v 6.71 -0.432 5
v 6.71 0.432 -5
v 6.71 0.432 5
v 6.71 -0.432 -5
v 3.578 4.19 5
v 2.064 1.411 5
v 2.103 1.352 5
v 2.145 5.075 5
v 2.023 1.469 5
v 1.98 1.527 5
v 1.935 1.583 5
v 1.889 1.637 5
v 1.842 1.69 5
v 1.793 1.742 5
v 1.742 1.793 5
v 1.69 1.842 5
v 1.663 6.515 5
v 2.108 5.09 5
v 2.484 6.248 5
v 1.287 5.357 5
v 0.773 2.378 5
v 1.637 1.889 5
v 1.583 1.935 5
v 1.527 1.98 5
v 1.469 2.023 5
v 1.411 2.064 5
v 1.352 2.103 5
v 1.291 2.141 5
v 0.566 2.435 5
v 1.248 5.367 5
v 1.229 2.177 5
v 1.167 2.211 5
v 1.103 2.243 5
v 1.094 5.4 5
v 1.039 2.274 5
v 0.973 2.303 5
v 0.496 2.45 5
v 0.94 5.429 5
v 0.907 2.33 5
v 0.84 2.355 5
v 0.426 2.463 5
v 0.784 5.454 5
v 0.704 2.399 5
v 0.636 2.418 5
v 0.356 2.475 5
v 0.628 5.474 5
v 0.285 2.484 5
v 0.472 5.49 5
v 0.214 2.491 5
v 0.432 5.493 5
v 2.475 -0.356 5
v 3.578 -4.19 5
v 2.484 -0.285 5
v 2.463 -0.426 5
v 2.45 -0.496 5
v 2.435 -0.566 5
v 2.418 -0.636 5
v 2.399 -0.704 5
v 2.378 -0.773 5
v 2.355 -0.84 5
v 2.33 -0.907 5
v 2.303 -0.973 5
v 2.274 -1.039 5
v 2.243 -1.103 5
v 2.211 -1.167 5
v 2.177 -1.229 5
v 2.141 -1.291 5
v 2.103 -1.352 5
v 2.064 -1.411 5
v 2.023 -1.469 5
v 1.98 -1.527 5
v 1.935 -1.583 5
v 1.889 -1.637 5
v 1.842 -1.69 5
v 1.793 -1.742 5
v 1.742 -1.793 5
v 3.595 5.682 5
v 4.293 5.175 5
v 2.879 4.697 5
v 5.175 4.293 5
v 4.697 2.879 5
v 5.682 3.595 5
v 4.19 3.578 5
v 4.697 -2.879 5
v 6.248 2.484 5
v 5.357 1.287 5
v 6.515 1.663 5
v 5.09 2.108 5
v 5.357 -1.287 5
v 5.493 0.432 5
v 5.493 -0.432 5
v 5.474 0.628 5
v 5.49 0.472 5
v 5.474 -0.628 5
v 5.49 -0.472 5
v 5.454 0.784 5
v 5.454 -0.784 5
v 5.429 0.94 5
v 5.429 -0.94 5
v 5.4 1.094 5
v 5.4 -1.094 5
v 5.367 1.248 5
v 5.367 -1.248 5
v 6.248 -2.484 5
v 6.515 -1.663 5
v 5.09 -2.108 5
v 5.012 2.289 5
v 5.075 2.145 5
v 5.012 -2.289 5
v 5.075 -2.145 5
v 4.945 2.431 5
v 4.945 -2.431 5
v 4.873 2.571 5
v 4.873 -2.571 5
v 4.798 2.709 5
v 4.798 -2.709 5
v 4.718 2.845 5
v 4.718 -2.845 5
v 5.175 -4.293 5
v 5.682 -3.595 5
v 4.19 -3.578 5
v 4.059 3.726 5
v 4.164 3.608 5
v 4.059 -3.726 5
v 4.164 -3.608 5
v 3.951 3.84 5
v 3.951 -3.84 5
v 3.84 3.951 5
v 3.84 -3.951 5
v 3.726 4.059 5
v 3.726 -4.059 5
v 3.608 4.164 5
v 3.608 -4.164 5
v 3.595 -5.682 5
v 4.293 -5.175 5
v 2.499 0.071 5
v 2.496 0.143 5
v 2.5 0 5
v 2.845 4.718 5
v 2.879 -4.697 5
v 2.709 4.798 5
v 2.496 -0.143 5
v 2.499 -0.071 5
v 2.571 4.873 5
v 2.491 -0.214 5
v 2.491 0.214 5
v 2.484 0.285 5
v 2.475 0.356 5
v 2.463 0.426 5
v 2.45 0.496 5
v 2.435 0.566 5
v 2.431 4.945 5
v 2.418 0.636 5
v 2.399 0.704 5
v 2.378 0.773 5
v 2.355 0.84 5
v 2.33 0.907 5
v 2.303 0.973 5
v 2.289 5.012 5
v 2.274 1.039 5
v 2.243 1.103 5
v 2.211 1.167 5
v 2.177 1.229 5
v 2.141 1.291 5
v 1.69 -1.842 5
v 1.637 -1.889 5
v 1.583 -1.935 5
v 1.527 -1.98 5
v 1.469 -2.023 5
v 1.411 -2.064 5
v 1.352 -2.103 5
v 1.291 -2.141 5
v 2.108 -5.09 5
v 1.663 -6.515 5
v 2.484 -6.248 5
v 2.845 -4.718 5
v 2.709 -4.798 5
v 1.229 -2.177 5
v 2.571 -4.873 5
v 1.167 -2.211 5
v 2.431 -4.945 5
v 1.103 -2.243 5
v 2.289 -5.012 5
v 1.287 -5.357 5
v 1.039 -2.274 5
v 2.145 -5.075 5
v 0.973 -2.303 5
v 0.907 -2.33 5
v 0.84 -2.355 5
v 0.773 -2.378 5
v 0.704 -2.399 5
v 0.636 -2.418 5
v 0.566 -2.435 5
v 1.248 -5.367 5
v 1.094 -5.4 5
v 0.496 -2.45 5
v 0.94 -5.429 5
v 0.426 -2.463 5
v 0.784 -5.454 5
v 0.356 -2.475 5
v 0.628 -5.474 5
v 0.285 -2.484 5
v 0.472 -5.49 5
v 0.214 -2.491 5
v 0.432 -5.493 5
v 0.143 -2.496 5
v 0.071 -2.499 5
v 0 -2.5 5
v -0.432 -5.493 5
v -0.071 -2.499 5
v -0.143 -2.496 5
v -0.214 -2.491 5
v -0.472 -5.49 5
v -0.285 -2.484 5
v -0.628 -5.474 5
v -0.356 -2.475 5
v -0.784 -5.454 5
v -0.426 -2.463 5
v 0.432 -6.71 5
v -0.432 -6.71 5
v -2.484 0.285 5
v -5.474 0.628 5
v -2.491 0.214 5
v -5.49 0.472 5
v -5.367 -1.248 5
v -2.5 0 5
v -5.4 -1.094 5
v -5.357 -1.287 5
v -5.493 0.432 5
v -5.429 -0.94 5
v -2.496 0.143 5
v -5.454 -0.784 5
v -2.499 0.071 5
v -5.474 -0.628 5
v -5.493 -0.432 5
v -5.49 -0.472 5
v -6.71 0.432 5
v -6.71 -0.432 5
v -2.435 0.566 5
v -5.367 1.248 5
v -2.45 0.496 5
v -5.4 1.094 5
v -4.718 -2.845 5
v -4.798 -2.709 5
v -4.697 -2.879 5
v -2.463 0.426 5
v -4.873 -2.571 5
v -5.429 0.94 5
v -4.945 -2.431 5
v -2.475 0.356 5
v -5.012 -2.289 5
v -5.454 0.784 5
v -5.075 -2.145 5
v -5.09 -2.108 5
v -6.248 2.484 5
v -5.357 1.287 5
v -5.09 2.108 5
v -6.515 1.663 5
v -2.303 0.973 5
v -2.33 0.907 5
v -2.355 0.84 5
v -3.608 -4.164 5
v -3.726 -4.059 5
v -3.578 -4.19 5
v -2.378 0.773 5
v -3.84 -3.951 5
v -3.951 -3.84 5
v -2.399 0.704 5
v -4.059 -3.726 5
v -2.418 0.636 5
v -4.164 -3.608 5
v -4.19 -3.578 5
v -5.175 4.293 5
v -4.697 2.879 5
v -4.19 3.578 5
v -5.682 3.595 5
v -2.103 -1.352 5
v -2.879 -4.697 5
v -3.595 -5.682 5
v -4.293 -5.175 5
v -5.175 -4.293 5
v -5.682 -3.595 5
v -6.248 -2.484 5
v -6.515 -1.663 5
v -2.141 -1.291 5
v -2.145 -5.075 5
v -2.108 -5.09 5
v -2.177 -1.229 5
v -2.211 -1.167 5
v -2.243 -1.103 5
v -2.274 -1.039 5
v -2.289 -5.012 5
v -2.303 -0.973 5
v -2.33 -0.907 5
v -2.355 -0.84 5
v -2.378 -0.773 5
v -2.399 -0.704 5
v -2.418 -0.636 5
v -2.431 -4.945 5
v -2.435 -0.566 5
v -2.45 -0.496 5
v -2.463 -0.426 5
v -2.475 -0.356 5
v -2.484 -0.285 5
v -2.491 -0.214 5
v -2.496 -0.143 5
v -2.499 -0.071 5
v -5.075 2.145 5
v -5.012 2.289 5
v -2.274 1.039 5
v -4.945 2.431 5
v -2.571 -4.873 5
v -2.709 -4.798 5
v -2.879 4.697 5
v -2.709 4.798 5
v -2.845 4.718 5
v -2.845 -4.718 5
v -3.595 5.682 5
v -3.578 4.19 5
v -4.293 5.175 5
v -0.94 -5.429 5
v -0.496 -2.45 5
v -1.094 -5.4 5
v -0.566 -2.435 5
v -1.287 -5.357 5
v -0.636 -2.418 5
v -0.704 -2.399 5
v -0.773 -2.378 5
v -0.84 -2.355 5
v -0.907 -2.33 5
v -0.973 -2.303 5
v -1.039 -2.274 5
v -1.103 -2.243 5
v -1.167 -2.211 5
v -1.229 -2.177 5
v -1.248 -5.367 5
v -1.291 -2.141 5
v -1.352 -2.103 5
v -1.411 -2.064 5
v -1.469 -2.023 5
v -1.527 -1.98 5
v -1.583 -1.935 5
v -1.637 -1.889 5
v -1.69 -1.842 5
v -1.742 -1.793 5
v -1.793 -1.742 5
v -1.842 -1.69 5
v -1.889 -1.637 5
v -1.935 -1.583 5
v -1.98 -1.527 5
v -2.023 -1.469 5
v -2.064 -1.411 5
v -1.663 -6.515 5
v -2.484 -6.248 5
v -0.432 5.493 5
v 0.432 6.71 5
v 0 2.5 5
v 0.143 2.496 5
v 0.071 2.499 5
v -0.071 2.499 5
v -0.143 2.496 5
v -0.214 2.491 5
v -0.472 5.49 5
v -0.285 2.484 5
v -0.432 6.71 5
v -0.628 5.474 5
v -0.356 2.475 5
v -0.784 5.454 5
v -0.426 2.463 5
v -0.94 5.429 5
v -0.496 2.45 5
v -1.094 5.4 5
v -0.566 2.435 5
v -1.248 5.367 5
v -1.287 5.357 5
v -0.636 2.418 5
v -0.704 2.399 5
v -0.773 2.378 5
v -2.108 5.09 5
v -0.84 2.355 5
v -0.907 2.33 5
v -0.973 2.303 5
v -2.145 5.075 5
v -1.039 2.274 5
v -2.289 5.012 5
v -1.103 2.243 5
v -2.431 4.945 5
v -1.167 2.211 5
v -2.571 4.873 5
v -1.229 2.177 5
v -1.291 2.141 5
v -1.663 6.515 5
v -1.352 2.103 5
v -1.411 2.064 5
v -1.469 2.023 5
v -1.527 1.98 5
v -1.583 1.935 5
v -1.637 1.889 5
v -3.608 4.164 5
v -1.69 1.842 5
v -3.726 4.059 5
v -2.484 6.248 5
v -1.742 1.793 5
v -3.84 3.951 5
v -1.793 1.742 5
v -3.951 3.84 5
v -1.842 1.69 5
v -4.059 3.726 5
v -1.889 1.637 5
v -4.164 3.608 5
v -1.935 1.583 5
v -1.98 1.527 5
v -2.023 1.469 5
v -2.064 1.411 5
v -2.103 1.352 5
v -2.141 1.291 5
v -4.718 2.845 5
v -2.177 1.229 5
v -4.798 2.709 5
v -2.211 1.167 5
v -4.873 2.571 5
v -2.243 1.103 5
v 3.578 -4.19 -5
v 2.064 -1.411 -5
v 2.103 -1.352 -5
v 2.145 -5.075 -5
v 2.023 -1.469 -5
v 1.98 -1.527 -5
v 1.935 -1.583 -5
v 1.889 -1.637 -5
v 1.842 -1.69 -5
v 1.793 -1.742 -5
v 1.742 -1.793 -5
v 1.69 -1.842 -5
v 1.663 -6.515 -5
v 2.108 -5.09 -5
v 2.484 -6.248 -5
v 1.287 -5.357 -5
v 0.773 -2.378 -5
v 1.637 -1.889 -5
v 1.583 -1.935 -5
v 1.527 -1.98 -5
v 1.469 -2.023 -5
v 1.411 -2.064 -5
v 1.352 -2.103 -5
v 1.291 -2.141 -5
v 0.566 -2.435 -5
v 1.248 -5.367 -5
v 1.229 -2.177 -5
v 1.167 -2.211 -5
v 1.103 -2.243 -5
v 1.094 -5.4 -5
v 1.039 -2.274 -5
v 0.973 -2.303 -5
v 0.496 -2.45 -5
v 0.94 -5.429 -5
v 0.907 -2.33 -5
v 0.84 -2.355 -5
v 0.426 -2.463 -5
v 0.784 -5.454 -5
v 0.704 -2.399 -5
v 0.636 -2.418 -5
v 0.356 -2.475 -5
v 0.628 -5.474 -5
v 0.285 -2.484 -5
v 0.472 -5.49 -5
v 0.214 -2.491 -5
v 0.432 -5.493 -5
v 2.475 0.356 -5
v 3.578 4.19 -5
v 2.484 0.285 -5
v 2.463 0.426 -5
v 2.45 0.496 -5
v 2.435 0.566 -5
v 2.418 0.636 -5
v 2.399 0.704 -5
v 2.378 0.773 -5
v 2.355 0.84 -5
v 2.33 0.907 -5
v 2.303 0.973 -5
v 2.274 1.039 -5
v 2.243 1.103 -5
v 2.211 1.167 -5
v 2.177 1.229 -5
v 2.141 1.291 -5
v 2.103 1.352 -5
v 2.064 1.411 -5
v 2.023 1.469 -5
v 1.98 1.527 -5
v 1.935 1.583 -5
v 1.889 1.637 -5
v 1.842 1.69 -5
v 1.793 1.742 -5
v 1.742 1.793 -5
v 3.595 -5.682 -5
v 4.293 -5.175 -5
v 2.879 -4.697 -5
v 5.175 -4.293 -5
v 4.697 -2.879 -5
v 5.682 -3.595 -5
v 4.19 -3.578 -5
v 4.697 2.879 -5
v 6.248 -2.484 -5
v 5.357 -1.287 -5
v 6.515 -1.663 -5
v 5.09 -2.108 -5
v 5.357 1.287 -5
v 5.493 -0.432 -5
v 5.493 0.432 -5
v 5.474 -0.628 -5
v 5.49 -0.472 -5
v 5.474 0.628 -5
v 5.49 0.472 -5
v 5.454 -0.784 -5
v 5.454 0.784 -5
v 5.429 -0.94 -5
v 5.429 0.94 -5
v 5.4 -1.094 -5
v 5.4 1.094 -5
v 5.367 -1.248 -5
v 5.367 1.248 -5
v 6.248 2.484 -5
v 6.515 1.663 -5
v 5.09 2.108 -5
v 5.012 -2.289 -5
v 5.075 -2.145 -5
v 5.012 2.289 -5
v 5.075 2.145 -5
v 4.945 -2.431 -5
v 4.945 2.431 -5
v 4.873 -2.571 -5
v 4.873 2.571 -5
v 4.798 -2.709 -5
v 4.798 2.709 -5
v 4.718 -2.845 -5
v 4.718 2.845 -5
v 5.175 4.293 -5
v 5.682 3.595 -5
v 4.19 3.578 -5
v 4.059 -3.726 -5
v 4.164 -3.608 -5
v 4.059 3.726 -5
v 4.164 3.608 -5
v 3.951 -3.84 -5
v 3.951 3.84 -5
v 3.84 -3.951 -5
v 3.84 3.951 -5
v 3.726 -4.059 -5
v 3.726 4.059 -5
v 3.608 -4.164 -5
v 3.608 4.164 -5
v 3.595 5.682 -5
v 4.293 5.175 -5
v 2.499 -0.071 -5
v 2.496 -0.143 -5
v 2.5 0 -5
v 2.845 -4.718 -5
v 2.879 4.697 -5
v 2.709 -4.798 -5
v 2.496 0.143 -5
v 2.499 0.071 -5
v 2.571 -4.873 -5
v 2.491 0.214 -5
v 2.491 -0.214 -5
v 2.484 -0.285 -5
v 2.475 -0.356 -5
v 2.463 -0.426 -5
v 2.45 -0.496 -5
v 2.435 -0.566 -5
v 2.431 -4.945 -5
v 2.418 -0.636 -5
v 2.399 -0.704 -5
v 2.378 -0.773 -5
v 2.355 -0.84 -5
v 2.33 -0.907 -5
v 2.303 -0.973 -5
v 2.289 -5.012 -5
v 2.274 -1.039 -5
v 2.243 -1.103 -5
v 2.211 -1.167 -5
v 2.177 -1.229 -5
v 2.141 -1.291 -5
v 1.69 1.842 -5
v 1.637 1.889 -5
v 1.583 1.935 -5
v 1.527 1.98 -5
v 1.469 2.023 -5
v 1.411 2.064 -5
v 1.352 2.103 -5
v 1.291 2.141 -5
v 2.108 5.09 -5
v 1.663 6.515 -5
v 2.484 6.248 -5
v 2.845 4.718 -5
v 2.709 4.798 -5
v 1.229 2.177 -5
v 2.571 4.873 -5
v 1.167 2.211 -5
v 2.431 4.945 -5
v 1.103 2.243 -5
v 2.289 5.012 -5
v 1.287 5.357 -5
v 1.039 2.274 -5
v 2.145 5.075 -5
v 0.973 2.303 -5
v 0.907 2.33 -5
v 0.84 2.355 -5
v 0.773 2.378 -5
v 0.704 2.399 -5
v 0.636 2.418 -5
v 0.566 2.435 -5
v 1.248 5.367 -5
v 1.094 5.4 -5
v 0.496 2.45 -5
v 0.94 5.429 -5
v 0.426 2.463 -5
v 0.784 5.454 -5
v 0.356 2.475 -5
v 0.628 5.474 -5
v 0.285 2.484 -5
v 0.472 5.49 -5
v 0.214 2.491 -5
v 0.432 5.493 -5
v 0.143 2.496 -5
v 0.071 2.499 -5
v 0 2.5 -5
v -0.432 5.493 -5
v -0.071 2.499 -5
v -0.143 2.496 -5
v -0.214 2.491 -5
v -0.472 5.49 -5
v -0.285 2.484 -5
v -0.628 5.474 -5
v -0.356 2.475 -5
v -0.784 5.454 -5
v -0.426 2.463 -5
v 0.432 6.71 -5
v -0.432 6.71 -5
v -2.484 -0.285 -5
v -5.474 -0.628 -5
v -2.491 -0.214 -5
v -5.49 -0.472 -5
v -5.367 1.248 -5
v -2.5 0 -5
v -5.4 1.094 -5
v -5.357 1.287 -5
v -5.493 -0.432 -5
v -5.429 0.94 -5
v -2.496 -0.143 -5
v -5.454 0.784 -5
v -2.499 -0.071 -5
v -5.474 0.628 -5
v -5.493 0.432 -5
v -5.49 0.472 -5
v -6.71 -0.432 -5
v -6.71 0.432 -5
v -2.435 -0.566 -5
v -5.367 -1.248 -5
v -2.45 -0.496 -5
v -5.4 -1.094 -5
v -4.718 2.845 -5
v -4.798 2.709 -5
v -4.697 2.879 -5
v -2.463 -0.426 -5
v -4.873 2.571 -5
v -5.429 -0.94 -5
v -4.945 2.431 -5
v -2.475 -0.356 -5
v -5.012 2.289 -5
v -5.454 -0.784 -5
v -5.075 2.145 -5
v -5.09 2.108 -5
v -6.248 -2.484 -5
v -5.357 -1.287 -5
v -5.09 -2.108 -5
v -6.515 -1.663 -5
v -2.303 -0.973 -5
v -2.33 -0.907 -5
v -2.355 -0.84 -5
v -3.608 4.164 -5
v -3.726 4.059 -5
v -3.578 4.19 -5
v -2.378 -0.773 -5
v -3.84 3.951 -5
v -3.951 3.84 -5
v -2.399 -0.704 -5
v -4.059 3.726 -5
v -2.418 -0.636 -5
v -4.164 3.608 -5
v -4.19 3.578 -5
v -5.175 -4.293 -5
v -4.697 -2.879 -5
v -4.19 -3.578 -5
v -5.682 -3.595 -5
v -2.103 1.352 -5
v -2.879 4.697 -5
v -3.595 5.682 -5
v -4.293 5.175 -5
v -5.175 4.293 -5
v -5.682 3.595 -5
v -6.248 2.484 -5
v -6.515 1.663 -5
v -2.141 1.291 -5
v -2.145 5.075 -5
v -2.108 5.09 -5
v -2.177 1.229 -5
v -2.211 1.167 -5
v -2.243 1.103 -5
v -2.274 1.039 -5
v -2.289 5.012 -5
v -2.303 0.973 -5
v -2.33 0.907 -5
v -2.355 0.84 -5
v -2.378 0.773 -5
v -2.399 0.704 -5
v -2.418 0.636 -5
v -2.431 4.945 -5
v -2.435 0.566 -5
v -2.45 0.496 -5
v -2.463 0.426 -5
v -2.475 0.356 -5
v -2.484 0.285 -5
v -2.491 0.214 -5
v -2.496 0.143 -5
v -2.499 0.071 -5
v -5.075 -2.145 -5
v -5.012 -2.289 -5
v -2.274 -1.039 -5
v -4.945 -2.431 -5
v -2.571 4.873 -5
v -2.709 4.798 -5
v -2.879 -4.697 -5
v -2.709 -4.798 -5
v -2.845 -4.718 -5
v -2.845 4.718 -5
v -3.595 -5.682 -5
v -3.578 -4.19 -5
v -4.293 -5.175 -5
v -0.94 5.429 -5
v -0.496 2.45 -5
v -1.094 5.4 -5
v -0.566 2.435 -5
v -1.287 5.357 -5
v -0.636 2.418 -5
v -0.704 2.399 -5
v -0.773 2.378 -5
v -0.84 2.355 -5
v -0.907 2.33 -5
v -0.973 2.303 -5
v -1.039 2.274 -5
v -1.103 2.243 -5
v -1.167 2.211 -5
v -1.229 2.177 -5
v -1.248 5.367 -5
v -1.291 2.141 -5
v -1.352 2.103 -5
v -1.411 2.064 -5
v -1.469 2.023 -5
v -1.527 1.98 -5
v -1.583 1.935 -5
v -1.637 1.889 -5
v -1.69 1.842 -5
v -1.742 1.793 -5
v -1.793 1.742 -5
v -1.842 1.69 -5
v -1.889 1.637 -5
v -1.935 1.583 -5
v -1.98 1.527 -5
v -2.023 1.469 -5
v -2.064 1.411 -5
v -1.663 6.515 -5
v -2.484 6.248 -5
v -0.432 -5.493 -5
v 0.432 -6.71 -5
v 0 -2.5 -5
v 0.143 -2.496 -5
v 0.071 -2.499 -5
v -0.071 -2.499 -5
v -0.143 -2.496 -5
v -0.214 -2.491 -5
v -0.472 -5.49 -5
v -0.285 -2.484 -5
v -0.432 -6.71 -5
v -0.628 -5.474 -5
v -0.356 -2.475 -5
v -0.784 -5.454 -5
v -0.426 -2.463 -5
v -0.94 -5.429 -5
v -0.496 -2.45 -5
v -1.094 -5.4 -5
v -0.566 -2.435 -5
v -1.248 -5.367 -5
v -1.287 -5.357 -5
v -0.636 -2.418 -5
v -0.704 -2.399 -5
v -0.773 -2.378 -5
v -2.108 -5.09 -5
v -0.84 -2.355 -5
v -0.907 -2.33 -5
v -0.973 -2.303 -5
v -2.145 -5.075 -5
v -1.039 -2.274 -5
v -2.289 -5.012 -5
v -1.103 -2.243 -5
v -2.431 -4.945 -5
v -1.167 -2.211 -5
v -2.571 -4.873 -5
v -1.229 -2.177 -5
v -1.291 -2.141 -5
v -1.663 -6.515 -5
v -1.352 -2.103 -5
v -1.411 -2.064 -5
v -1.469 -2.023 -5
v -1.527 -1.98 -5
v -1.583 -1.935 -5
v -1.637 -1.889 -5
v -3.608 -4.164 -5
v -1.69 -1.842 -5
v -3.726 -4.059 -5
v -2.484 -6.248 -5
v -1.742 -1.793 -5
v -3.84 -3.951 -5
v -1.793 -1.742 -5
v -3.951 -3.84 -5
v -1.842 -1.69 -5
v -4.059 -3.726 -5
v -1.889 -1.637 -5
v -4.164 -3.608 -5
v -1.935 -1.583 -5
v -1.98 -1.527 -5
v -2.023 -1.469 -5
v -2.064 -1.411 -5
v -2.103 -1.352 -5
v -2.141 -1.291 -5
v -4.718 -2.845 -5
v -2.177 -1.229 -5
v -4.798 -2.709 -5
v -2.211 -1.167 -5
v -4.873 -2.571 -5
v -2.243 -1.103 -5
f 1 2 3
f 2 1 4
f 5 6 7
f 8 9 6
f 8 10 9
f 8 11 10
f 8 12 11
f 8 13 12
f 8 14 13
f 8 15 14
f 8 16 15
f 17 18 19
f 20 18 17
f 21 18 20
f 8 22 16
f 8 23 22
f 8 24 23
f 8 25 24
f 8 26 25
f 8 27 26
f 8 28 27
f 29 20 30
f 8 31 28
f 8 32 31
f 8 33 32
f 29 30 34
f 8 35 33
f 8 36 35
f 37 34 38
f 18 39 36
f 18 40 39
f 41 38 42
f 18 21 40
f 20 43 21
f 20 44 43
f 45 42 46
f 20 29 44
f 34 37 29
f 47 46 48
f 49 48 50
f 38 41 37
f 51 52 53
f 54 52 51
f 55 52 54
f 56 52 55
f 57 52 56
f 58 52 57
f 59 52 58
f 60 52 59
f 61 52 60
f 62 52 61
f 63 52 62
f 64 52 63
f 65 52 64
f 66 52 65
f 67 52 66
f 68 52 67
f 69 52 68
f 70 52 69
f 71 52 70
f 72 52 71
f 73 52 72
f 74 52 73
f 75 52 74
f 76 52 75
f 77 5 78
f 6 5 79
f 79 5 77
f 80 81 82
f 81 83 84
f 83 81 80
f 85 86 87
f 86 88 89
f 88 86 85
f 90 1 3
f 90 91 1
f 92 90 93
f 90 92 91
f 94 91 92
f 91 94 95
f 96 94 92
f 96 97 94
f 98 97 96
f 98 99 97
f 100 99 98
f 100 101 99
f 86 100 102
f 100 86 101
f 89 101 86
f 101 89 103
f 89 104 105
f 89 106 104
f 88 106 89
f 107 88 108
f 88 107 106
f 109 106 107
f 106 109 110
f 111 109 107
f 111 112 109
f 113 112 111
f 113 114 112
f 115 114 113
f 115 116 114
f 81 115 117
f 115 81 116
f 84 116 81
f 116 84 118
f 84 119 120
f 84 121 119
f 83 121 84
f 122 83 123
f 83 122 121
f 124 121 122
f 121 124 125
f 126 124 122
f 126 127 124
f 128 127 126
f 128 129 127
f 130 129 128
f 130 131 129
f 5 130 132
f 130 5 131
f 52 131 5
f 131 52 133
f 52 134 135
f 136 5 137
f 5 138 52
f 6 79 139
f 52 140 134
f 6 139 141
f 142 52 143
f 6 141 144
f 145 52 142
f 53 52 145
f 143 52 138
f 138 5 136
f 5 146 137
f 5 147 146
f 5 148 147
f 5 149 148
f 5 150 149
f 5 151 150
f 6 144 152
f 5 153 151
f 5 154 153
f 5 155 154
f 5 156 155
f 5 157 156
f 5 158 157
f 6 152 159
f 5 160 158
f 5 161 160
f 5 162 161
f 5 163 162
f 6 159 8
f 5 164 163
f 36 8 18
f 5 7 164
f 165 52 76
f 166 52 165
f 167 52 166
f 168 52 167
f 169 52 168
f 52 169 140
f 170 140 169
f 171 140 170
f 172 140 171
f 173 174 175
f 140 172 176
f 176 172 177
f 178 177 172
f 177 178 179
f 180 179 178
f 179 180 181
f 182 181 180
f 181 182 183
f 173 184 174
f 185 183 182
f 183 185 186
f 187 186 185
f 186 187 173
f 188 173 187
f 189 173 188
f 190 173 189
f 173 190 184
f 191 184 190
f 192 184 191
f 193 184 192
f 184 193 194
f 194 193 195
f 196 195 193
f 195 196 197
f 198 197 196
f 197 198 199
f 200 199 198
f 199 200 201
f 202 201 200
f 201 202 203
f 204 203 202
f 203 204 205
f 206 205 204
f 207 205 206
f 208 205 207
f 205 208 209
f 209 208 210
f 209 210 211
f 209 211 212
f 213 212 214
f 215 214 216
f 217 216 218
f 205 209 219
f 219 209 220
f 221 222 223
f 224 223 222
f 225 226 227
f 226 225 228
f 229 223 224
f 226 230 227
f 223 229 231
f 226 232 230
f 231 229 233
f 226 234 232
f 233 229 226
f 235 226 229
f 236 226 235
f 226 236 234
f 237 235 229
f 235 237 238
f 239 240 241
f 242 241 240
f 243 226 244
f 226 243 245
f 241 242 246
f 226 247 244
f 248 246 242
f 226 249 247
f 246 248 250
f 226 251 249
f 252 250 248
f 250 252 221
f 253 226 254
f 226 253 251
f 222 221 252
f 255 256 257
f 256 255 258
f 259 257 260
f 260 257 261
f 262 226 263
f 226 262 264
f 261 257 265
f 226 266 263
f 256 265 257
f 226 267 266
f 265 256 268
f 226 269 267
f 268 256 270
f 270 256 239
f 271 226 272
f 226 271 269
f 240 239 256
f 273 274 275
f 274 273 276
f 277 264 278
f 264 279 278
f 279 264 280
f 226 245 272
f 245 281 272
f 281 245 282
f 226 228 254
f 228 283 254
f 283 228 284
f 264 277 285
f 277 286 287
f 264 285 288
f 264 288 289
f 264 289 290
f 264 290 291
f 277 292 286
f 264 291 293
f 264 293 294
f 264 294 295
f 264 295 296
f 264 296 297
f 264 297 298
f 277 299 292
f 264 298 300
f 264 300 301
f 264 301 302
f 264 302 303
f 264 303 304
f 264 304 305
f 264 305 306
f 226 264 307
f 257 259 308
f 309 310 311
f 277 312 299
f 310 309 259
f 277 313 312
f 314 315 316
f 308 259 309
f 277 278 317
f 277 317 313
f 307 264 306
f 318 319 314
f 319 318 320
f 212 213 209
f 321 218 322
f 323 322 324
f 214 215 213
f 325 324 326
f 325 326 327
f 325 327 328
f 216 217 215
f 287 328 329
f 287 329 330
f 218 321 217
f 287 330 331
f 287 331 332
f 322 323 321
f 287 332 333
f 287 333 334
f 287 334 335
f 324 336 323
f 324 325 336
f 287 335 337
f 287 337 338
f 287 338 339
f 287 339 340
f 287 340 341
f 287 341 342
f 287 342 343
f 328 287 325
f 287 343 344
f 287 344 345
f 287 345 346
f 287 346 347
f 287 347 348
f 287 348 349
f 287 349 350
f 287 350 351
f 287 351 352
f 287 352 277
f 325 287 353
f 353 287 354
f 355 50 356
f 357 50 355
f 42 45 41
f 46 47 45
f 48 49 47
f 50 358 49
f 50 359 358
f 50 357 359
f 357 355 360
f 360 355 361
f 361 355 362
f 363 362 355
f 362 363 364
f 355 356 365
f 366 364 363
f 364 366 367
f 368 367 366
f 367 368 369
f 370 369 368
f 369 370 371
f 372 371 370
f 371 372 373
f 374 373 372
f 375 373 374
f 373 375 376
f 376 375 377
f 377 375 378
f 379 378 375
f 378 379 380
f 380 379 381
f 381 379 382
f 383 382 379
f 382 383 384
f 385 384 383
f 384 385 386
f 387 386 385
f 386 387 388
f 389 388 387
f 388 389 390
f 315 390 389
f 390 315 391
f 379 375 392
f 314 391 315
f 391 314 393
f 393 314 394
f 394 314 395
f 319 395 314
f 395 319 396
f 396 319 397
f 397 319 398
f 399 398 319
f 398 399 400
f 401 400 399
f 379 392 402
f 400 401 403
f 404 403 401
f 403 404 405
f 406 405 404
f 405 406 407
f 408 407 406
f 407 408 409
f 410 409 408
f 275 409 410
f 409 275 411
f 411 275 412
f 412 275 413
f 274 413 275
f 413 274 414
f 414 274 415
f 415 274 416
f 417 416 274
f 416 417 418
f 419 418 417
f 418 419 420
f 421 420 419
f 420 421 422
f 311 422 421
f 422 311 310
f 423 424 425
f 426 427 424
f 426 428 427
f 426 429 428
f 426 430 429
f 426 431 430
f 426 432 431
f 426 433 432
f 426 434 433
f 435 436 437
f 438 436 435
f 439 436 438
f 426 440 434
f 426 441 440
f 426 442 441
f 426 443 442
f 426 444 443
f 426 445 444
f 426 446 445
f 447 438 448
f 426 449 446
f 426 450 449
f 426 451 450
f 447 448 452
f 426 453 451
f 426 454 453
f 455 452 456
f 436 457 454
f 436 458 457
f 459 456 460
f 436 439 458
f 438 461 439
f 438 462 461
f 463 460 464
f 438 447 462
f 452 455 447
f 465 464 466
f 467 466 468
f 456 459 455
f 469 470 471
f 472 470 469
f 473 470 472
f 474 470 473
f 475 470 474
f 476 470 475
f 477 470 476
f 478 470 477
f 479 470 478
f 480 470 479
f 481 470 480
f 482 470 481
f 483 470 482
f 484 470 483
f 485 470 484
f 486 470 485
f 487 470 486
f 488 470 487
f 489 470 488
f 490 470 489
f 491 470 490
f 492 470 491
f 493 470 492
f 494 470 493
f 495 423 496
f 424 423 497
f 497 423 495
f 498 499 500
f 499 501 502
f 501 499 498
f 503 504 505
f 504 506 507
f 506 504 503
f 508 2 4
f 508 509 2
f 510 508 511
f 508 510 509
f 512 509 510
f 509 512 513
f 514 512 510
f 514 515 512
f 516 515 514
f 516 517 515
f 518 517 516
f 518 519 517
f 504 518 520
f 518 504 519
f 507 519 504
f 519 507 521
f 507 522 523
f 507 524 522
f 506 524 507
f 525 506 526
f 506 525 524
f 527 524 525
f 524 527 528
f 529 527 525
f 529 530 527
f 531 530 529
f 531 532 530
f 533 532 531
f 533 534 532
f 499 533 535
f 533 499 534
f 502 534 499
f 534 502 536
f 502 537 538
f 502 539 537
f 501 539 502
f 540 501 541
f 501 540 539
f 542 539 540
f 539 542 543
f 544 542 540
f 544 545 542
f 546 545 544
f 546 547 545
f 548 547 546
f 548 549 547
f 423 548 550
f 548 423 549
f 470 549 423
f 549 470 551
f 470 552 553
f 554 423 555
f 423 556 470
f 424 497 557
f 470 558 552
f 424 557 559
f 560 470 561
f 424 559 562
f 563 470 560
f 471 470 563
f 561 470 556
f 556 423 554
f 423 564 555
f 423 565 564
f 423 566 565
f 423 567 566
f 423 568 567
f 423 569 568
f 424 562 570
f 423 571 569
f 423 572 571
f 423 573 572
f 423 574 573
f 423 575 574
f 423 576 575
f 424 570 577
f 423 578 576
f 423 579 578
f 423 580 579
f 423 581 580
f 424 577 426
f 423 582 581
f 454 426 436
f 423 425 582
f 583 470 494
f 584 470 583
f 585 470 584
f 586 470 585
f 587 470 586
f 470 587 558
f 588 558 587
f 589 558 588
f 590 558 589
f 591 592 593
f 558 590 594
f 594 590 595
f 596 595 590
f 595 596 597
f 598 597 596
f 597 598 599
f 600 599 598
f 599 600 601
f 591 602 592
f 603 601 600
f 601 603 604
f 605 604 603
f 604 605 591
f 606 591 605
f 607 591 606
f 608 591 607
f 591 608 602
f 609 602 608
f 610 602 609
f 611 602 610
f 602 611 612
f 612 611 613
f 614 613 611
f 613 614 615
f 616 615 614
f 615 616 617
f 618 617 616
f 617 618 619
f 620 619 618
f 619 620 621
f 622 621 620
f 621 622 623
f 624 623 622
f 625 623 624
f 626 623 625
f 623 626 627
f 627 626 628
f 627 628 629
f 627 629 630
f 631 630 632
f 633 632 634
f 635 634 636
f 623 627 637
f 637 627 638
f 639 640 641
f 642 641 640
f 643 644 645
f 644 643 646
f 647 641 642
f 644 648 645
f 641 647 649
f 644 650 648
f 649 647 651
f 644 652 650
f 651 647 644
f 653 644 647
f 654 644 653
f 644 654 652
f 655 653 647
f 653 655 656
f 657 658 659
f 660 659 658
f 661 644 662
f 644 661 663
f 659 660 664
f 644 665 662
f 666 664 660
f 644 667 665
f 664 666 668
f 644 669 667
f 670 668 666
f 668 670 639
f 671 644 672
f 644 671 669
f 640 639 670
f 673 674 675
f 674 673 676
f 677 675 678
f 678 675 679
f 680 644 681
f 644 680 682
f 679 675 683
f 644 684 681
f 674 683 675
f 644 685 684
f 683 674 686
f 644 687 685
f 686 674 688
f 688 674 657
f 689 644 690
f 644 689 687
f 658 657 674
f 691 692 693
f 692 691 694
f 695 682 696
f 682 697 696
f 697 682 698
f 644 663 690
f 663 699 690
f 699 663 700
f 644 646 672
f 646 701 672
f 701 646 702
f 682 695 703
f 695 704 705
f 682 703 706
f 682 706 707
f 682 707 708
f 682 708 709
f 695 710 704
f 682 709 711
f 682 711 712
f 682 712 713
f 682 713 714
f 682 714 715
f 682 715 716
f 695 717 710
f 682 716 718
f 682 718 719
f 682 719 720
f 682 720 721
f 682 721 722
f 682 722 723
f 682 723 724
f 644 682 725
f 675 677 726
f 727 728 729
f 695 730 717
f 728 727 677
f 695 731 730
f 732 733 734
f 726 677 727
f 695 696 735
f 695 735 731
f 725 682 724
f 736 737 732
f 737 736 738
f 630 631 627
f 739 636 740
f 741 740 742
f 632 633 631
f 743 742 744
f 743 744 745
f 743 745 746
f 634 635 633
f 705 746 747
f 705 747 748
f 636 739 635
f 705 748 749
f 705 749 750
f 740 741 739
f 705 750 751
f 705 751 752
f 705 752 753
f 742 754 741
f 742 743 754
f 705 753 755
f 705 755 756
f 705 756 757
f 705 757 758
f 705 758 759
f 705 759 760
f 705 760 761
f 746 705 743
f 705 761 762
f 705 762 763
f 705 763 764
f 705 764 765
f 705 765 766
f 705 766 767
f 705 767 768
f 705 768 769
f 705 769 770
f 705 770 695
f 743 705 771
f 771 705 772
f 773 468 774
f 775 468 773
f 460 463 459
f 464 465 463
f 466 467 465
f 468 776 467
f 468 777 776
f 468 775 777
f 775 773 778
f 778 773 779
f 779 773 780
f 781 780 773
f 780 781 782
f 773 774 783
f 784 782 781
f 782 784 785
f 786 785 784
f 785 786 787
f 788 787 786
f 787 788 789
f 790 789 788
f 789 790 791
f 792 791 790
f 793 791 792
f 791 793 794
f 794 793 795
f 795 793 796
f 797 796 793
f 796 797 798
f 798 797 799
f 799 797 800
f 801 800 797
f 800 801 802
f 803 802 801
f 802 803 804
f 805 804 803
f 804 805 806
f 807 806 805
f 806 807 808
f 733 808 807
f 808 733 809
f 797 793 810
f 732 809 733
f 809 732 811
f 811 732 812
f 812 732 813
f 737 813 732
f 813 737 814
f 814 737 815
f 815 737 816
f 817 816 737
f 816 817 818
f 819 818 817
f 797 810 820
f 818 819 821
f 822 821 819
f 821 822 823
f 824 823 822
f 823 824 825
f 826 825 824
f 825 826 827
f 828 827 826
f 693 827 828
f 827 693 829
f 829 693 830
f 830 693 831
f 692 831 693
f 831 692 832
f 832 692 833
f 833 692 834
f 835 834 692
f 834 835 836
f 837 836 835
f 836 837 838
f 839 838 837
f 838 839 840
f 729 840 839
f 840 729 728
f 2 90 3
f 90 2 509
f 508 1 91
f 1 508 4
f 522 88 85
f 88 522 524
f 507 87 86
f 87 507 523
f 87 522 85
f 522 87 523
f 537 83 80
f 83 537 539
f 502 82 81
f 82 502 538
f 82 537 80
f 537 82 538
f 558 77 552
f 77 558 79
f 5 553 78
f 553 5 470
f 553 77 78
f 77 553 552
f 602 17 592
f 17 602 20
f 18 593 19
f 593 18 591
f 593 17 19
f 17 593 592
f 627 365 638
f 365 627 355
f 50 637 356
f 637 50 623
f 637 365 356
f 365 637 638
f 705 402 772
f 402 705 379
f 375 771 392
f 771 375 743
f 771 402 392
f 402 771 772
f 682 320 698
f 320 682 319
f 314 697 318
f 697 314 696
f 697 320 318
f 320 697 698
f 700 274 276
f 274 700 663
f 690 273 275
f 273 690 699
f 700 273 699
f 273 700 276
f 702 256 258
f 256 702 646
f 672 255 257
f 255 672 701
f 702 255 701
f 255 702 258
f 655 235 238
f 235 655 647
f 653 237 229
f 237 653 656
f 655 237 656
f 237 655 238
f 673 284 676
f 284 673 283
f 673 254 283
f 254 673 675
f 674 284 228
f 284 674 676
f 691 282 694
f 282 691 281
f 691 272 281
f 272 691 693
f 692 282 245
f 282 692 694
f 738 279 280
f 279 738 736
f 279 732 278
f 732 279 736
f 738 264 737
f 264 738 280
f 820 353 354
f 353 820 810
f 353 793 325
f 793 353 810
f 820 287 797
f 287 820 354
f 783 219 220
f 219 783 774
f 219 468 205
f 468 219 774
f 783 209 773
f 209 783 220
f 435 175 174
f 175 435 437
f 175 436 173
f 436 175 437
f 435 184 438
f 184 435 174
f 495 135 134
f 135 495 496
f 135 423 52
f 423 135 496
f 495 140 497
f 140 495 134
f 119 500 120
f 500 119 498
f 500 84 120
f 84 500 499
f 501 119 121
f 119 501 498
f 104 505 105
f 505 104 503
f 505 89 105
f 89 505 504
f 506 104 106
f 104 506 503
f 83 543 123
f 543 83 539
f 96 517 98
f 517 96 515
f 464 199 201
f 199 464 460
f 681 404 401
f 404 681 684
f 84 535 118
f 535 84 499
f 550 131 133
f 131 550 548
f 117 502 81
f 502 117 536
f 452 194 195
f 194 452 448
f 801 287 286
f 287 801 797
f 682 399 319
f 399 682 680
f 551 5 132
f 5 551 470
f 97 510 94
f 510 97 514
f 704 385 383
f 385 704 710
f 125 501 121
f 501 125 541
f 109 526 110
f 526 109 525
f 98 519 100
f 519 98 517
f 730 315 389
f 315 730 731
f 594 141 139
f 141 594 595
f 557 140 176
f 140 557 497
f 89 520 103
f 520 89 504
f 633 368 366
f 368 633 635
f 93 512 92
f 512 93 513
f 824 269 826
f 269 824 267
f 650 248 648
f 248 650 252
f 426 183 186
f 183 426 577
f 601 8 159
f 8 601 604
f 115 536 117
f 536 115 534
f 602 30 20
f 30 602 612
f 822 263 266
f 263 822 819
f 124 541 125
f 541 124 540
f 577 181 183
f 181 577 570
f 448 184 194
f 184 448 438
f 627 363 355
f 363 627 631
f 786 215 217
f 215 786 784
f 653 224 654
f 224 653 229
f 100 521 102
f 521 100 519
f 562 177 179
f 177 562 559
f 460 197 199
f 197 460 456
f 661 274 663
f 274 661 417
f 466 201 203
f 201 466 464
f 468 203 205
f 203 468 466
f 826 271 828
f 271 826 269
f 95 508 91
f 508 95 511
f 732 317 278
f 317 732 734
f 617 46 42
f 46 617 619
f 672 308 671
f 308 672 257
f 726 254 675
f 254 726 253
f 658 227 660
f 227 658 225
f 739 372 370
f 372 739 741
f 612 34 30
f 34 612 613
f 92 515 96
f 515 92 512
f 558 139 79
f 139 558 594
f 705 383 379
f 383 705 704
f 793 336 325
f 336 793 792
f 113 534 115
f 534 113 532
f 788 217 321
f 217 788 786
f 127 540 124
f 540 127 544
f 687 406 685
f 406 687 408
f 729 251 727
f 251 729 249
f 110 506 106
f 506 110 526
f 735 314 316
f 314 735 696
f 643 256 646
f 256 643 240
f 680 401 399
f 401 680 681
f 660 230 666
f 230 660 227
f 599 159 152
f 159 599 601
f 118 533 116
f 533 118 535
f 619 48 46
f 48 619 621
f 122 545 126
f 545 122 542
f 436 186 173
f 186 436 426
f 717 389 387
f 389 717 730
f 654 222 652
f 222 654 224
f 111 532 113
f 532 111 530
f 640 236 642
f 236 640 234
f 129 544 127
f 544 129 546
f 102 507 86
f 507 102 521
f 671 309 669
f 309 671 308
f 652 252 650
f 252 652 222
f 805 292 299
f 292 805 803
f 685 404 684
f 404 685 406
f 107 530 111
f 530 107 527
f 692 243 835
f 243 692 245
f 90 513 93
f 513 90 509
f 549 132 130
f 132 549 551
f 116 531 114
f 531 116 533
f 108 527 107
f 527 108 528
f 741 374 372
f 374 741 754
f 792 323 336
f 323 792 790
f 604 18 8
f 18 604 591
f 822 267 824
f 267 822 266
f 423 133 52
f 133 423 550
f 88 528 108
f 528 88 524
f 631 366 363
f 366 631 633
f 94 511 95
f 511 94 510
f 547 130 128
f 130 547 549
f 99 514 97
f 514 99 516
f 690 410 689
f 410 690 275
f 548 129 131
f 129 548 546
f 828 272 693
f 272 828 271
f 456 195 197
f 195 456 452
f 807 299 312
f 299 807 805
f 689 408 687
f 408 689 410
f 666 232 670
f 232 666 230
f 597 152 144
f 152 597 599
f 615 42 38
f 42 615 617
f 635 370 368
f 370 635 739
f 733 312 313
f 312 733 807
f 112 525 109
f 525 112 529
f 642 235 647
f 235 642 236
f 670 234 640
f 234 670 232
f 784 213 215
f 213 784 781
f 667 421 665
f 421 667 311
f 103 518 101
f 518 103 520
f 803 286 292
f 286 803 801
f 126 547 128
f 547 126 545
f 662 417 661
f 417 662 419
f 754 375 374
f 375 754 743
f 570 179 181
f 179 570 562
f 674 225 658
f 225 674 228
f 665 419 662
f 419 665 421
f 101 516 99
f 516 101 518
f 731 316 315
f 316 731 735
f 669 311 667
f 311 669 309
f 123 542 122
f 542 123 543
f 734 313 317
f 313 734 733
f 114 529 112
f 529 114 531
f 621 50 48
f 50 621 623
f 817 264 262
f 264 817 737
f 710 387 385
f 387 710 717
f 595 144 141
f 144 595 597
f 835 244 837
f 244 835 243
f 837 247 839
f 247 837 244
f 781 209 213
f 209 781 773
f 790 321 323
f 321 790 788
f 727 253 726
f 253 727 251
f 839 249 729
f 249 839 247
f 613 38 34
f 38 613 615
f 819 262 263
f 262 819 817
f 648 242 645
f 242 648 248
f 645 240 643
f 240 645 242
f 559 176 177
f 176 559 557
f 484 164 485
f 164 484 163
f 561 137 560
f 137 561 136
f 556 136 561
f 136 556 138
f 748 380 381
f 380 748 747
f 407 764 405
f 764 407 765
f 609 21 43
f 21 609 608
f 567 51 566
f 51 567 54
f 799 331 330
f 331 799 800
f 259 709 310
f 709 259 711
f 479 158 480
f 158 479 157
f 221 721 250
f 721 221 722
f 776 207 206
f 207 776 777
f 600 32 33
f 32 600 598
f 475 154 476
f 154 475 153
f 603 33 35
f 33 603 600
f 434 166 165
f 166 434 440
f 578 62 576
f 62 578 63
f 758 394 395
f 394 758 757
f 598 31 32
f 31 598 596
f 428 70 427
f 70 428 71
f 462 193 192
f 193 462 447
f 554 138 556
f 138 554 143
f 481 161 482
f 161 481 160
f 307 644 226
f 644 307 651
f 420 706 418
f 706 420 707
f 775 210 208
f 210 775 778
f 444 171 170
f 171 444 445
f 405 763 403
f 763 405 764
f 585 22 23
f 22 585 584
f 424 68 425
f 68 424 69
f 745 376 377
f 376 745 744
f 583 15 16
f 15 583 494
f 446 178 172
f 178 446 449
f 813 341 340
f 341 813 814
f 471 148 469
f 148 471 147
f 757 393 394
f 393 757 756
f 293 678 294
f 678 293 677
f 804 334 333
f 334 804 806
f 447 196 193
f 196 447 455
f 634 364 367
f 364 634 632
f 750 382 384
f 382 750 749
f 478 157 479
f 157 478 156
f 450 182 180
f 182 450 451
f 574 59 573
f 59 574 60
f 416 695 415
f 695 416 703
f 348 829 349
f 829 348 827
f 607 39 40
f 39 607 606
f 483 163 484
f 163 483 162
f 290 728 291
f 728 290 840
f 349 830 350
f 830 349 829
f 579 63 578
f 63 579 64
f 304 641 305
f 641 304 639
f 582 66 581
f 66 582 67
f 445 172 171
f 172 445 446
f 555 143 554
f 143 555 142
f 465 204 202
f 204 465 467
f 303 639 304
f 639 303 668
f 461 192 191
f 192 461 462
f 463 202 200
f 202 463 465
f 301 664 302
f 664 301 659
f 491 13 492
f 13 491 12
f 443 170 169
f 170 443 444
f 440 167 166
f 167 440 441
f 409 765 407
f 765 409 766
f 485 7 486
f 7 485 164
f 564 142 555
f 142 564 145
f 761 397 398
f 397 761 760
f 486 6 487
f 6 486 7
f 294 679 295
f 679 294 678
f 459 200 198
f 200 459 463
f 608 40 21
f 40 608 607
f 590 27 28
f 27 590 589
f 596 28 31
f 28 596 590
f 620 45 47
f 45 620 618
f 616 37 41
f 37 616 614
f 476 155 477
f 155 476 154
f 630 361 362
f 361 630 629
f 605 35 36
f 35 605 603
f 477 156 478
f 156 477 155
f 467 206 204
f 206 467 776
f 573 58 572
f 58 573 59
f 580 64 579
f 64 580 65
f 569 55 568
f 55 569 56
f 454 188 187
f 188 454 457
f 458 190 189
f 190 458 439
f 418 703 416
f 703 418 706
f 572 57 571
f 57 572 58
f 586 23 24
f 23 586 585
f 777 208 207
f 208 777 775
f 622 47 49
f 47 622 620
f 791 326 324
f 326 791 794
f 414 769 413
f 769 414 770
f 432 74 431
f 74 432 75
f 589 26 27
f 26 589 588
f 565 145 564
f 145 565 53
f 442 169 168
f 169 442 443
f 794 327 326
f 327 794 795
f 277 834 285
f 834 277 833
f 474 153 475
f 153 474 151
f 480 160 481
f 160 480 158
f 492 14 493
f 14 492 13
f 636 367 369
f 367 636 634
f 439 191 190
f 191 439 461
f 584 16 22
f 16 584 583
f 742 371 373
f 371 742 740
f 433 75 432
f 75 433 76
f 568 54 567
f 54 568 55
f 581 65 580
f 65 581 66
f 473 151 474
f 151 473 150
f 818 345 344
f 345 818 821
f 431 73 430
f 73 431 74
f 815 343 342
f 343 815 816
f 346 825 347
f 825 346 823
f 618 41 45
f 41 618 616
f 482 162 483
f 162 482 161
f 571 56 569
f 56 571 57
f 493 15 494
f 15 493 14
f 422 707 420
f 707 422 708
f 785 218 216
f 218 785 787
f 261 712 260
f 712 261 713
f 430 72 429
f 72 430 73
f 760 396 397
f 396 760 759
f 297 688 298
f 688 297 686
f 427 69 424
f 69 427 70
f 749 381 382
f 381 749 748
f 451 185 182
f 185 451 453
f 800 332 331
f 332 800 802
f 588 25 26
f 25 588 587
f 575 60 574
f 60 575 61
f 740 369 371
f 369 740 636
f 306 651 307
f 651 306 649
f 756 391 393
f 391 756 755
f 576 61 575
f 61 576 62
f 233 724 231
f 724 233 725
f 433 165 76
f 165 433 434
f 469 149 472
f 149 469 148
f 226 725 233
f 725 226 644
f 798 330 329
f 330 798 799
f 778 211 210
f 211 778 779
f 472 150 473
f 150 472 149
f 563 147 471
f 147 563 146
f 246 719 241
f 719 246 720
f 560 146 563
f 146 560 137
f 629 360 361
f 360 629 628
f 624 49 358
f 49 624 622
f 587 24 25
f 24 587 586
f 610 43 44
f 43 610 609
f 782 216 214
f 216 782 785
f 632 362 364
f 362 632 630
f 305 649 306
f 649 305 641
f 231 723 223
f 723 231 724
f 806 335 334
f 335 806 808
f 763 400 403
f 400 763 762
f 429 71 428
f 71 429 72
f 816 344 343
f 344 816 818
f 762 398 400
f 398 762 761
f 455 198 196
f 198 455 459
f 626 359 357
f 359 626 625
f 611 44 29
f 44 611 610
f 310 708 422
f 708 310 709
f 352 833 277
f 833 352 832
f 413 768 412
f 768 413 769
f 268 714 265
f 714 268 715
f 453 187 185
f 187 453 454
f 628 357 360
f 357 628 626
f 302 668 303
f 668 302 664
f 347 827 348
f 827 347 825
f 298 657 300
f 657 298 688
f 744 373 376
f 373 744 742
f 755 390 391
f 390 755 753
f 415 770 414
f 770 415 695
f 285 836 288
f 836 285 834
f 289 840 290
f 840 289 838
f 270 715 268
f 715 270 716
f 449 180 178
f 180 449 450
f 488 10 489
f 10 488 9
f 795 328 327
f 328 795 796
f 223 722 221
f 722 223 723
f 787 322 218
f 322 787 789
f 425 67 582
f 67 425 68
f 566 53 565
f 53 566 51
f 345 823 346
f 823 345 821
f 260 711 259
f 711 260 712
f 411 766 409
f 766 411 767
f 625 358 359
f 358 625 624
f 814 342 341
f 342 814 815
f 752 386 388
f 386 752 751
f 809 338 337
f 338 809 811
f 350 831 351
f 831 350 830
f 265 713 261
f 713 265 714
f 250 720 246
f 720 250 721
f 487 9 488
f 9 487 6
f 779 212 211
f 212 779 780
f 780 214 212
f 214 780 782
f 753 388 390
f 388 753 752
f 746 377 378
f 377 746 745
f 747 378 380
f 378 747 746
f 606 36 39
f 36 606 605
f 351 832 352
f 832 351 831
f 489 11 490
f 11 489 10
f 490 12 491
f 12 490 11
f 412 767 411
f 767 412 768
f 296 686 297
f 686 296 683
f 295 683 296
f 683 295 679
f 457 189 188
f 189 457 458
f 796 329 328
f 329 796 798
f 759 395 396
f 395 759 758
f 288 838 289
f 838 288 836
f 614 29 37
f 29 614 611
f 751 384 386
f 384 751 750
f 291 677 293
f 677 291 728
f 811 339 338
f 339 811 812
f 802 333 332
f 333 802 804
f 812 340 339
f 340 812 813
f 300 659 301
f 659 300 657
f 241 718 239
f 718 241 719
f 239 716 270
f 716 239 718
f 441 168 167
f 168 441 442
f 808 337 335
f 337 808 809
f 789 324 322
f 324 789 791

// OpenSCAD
$fn = 220;

// Timing pulley parameters
teeth    = 20;
pitch_d  = 12.22;                 // mm (pitch diameter)
pitch    = PI * pitch_d / teeth;  // circular pitch

pulley_width = 10;                // mm
bore_d       = 5;                 // mm

// Tooth geometry (simple rectangular tooth, centered on tooth angle)
tooth_height    = 1.2;            // mm radial height above root cylinder
tooth_thickness = pitch * 0.45;   // mm tangential thickness at mid-radius

// Derived radii
r_pitch = pitch_d/2;

// Place pitch circle approximately mid-tooth height so pitch diameter is meaningful
r_root  = r_pitch - tooth_height/2;
r_tip   = r_root + tooth_height;

// Ensure teeth overlap into the root cylinder so the model is one connected solid
tooth_overlap = 0.25;             // mm (radial overlap into root cylinder)

module tooth3d() {
    // A single tooth as a tangential rectangle, extruded along Z
    // Positioned so its inner face overlaps into the root cylinder.
    translate([r_root + (tooth_height/2) - tooth_overlap, 0, 0])
        cube([tooth_height + 2*tooth_overlap, tooth_thickness, pulley_width], center=true);
}

module pulley() {
    difference() {
        union() {
            // Root cylinder (body under teeth)
            cylinder(h=pulley_width, r=r_root, center=true);

            // Teeth
            for (i = [0:teeth-1])
                rotate([0, 0, i * 360 / teeth])
                    tooth3d();
        }

        // Bore
        cylinder(h=pulley_width + 2, r=bore_d/2, center=true);
    }
}

pulley();
